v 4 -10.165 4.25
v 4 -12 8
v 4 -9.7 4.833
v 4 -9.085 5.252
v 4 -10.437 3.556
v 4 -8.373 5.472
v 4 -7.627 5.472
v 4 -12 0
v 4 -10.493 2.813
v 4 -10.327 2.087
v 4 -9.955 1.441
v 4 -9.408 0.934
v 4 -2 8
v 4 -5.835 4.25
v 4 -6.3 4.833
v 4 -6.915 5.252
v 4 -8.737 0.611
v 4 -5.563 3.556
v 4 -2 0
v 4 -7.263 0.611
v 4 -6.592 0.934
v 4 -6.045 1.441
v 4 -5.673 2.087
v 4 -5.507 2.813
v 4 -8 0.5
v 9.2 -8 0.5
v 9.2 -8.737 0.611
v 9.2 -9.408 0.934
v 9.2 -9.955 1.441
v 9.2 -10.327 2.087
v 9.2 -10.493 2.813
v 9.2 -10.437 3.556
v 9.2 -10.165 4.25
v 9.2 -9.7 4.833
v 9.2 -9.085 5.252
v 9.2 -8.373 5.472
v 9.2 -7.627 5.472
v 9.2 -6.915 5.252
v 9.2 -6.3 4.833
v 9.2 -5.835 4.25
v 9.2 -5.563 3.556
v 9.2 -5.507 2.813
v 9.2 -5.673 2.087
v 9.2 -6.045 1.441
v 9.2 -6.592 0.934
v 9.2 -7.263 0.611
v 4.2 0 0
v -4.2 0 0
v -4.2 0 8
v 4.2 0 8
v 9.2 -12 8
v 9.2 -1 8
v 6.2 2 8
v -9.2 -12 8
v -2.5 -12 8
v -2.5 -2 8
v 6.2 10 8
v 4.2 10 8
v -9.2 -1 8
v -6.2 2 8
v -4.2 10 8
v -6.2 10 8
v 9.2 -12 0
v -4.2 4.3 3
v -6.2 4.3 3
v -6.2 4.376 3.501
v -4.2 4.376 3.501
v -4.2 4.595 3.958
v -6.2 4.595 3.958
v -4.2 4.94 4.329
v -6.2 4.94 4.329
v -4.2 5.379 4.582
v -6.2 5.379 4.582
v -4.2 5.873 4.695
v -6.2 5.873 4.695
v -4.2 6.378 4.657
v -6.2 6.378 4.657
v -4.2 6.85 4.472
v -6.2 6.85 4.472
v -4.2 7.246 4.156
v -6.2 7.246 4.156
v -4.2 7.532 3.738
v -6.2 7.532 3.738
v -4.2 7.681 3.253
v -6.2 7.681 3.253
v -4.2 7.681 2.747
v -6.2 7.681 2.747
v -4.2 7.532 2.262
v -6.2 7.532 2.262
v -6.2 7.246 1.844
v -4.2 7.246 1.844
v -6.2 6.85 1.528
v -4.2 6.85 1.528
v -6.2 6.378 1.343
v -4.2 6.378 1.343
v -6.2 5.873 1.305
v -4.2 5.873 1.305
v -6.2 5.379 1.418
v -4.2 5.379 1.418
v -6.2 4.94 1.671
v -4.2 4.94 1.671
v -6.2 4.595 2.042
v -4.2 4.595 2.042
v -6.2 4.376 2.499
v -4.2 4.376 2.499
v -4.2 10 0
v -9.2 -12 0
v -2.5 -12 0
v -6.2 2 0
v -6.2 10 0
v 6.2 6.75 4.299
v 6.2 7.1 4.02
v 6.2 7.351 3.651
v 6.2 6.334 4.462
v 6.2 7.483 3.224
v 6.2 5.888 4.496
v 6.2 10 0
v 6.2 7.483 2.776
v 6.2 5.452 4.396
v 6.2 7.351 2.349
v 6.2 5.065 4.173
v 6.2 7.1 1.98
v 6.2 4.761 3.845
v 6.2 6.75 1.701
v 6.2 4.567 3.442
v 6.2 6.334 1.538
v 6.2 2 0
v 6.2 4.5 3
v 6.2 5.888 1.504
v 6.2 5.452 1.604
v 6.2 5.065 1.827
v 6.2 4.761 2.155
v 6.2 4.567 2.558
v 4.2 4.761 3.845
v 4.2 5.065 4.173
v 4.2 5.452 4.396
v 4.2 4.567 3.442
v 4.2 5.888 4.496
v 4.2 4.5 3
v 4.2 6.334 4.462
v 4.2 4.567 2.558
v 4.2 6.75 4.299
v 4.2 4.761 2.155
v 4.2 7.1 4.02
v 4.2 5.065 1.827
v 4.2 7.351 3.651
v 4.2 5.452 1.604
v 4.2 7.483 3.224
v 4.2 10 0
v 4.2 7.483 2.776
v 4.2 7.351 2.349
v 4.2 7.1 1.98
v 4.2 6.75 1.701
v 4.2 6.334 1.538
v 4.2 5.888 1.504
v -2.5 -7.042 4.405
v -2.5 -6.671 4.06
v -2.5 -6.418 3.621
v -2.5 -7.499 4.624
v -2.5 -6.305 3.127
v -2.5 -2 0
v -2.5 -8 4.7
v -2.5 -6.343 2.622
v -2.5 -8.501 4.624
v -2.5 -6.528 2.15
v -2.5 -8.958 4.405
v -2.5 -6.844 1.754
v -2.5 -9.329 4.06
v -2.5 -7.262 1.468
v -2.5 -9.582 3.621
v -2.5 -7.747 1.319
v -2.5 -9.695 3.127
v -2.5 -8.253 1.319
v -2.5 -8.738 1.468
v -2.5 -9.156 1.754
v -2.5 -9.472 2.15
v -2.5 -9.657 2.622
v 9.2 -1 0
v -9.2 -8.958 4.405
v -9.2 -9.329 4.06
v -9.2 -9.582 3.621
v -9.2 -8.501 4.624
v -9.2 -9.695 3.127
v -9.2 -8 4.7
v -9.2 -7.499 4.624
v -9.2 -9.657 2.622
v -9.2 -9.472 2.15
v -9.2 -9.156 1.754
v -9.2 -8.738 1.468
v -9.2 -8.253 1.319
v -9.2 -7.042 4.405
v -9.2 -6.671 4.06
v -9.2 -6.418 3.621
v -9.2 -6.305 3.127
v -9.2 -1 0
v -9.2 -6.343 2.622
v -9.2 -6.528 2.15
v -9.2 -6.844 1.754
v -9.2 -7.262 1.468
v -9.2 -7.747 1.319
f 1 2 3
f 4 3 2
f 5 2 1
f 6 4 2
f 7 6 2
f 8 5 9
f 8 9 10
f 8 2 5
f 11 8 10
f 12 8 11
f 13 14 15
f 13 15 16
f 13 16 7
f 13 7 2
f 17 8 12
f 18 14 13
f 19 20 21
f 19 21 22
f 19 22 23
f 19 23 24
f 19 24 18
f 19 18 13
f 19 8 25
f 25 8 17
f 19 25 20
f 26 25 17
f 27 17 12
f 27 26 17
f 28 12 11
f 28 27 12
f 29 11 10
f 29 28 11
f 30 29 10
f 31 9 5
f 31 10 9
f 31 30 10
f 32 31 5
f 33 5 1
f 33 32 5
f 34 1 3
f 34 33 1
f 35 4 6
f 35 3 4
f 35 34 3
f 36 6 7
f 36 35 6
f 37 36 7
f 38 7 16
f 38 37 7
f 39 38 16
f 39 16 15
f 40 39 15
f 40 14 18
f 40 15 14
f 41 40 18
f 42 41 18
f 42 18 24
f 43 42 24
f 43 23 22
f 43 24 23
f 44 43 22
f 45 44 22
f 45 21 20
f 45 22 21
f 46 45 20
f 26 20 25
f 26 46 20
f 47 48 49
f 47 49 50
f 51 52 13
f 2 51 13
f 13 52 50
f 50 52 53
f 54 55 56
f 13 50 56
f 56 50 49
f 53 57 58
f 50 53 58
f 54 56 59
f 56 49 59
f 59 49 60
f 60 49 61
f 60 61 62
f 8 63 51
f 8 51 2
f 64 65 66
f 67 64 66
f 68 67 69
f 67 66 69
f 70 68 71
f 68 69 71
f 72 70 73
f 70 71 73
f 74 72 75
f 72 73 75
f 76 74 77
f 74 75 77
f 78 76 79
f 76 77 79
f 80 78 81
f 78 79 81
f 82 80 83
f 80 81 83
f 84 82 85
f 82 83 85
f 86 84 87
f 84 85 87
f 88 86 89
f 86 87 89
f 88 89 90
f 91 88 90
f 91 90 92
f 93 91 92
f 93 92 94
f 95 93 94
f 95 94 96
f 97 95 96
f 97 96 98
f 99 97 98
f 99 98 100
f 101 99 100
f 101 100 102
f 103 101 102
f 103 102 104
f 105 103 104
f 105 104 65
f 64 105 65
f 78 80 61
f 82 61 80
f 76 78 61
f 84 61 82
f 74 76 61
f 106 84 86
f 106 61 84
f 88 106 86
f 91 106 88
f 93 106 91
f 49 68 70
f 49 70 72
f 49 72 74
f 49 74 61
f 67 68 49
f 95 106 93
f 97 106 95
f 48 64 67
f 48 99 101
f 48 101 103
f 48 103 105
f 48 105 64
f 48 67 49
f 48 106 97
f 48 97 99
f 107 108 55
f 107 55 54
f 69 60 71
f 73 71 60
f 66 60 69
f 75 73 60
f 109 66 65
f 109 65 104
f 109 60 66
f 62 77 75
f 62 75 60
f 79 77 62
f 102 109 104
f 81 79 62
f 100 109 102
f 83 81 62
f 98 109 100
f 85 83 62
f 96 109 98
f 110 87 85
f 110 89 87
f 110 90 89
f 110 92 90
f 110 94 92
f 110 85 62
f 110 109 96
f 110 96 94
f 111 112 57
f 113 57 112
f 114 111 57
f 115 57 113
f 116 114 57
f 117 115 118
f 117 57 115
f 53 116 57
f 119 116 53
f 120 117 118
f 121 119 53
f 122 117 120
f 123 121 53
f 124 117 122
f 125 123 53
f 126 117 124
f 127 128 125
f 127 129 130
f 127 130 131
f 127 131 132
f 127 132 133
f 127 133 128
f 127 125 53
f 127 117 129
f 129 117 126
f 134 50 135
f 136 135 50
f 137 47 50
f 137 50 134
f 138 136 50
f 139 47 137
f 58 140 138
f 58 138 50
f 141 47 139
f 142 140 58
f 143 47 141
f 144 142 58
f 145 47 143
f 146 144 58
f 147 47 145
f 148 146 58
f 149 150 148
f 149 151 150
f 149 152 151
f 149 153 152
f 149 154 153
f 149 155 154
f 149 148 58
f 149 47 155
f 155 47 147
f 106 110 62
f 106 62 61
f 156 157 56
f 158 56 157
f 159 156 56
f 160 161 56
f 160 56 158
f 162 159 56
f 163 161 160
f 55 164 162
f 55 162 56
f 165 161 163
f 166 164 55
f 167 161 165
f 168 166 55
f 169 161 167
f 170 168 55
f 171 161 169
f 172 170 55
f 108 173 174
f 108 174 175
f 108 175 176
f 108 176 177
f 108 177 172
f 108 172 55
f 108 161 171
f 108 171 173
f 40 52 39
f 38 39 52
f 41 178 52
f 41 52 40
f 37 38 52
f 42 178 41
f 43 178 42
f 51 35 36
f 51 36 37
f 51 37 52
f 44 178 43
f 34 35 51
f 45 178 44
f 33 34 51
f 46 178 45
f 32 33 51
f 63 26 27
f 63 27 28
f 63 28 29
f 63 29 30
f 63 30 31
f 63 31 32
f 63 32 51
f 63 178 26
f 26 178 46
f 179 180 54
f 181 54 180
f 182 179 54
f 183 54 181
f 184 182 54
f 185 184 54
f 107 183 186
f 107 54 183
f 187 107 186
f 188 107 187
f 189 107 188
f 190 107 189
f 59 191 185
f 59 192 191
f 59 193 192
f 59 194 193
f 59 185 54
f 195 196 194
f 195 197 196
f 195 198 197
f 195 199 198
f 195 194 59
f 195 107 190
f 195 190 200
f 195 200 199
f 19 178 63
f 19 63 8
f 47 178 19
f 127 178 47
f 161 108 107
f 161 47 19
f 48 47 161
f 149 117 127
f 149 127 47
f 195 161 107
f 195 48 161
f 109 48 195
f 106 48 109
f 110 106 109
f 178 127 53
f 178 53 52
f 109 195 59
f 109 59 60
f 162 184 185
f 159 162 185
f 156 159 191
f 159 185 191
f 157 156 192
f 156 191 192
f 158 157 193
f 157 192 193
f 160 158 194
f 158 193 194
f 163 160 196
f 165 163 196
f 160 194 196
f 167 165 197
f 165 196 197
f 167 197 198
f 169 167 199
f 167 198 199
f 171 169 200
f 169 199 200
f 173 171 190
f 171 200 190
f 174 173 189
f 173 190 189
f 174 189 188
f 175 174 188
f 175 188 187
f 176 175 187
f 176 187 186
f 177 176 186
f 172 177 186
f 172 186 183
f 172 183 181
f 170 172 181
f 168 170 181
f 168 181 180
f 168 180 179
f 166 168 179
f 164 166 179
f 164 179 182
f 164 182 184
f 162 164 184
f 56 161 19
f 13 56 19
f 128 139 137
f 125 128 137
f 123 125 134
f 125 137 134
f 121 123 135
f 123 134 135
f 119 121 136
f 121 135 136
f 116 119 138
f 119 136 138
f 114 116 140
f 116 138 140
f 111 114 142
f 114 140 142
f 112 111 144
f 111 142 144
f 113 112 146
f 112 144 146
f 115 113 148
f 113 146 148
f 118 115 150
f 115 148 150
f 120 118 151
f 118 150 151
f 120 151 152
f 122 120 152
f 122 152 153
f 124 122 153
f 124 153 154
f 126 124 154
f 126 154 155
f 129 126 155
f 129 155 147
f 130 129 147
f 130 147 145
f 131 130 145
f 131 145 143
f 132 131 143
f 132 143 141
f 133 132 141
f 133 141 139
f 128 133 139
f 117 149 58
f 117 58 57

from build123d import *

# Parameters (mm, degrees)
AUFSATZ_LINEAR_AUSTRAGEN1_DEPTH = 8
SKIZZE3_R                       = 2.5
SCHNITT_LINEAR_AUSTRAGEN1_DEPTH = 10
SCHNITT_LINEAR_AUSTRAGEN2_REACH = 25.379
SKIZZE4_R                       = 1.7
SCHNITT_LINEAR_AUSTRAGEN3_REACH = 23.099
SKIZZE5_R                       = 1.7
SKIZZE6_R                       = 1.5
SCHNITT_LINEAR_AUSTRAGEN4_DEPTH = 5


with BuildPart() as part:
    # Skizze2 → Aufsatz-Linear austragen1 (new body)
    with BuildSketch(Plane.XY):
        Polygon((-4.2, 0), (4.2, 0), (4.2, 10), (6.2, 10), (6.2, 2), (9.2, -1), (9.2, -12), (4, -12), (4, -2), (0, -2), (-2.5, -2), (-2.5, -12), (-9.2, -12), (-9.2, -1), (-6.2, 2), (-6.2, 10), (-4.2, 10), align=None)
    extrude(amount=AUFSATZ_LINEAR_AUSTRAGEN1_DEPTH)

    # Skizze3 → Schnitt-Linear austragen1 (cut)
    with BuildSketch(Plane.ZY.offset(-9.2)):
        with Locations(Location((3, -8, 0), (0, 0, 180))):
            Circle(SKIZZE3_R)
    extrude(amount=SCHNITT_LINEAR_AUSTRAGEN1_DEPTH, mode=Mode.SUBTRACT)

    # Skizze4 → Schnitt-Linear austragen2 (cut, up to next)
    with BuildSketch(Plane.ZY.offset(9.2), mode=Mode.PRIVATE) as schnitt_linear_austragen2_sk1:
        with Locations((3, -8)):
            Circle(SKIZZE4_R)
    schnitt_linear_austragen2_tool1 = extrude(schnitt_linear_austragen2_sk1.sketch, amount=-SCHNITT_LINEAR_AUSTRAGEN2_REACH, mode=Mode.PRIVATE) & part.part
    add(schnitt_linear_austragen2_tool1.solids().sort_by_distance((-9.2, -8, 3))[0], mode=Mode.SUBTRACT)

    # Skizze5 → Schnitt-Linear austragen3 (cut, up to next)
    with BuildSketch(Plane.ZY.offset(6.2), mode=Mode.PRIVATE) as schnitt_linear_austragen3_sk1:
        with Locations(Location((3, 6, 0), (0, 0, 270))):
            Circle(SKIZZE5_R)
    schnitt_linear_austragen3_tool1 = extrude(schnitt_linear_austragen3_sk1.sketch, amount=-SCHNITT_LINEAR_AUSTRAGEN3_REACH, mode=Mode.PRIVATE) & part.part
    add(schnitt_linear_austragen3_tool1.solids().sort_by_distance((-6.2, 6, 3))[0], mode=Mode.SUBTRACT)

    # Skizze6 → Schnitt-Linear austragen4 (cut)
    with BuildSketch(Plane.ZY.offset(-4.2)):
        with Locations(Location((3, 6, 0), (0, 0, 270))):
            Circle(SKIZZE6_R)
    extrude(amount=-SCHNITT_LINEAR_AUSTRAGEN4_DEPTH, mode=Mode.SUBTRACT)


solid = part.part
